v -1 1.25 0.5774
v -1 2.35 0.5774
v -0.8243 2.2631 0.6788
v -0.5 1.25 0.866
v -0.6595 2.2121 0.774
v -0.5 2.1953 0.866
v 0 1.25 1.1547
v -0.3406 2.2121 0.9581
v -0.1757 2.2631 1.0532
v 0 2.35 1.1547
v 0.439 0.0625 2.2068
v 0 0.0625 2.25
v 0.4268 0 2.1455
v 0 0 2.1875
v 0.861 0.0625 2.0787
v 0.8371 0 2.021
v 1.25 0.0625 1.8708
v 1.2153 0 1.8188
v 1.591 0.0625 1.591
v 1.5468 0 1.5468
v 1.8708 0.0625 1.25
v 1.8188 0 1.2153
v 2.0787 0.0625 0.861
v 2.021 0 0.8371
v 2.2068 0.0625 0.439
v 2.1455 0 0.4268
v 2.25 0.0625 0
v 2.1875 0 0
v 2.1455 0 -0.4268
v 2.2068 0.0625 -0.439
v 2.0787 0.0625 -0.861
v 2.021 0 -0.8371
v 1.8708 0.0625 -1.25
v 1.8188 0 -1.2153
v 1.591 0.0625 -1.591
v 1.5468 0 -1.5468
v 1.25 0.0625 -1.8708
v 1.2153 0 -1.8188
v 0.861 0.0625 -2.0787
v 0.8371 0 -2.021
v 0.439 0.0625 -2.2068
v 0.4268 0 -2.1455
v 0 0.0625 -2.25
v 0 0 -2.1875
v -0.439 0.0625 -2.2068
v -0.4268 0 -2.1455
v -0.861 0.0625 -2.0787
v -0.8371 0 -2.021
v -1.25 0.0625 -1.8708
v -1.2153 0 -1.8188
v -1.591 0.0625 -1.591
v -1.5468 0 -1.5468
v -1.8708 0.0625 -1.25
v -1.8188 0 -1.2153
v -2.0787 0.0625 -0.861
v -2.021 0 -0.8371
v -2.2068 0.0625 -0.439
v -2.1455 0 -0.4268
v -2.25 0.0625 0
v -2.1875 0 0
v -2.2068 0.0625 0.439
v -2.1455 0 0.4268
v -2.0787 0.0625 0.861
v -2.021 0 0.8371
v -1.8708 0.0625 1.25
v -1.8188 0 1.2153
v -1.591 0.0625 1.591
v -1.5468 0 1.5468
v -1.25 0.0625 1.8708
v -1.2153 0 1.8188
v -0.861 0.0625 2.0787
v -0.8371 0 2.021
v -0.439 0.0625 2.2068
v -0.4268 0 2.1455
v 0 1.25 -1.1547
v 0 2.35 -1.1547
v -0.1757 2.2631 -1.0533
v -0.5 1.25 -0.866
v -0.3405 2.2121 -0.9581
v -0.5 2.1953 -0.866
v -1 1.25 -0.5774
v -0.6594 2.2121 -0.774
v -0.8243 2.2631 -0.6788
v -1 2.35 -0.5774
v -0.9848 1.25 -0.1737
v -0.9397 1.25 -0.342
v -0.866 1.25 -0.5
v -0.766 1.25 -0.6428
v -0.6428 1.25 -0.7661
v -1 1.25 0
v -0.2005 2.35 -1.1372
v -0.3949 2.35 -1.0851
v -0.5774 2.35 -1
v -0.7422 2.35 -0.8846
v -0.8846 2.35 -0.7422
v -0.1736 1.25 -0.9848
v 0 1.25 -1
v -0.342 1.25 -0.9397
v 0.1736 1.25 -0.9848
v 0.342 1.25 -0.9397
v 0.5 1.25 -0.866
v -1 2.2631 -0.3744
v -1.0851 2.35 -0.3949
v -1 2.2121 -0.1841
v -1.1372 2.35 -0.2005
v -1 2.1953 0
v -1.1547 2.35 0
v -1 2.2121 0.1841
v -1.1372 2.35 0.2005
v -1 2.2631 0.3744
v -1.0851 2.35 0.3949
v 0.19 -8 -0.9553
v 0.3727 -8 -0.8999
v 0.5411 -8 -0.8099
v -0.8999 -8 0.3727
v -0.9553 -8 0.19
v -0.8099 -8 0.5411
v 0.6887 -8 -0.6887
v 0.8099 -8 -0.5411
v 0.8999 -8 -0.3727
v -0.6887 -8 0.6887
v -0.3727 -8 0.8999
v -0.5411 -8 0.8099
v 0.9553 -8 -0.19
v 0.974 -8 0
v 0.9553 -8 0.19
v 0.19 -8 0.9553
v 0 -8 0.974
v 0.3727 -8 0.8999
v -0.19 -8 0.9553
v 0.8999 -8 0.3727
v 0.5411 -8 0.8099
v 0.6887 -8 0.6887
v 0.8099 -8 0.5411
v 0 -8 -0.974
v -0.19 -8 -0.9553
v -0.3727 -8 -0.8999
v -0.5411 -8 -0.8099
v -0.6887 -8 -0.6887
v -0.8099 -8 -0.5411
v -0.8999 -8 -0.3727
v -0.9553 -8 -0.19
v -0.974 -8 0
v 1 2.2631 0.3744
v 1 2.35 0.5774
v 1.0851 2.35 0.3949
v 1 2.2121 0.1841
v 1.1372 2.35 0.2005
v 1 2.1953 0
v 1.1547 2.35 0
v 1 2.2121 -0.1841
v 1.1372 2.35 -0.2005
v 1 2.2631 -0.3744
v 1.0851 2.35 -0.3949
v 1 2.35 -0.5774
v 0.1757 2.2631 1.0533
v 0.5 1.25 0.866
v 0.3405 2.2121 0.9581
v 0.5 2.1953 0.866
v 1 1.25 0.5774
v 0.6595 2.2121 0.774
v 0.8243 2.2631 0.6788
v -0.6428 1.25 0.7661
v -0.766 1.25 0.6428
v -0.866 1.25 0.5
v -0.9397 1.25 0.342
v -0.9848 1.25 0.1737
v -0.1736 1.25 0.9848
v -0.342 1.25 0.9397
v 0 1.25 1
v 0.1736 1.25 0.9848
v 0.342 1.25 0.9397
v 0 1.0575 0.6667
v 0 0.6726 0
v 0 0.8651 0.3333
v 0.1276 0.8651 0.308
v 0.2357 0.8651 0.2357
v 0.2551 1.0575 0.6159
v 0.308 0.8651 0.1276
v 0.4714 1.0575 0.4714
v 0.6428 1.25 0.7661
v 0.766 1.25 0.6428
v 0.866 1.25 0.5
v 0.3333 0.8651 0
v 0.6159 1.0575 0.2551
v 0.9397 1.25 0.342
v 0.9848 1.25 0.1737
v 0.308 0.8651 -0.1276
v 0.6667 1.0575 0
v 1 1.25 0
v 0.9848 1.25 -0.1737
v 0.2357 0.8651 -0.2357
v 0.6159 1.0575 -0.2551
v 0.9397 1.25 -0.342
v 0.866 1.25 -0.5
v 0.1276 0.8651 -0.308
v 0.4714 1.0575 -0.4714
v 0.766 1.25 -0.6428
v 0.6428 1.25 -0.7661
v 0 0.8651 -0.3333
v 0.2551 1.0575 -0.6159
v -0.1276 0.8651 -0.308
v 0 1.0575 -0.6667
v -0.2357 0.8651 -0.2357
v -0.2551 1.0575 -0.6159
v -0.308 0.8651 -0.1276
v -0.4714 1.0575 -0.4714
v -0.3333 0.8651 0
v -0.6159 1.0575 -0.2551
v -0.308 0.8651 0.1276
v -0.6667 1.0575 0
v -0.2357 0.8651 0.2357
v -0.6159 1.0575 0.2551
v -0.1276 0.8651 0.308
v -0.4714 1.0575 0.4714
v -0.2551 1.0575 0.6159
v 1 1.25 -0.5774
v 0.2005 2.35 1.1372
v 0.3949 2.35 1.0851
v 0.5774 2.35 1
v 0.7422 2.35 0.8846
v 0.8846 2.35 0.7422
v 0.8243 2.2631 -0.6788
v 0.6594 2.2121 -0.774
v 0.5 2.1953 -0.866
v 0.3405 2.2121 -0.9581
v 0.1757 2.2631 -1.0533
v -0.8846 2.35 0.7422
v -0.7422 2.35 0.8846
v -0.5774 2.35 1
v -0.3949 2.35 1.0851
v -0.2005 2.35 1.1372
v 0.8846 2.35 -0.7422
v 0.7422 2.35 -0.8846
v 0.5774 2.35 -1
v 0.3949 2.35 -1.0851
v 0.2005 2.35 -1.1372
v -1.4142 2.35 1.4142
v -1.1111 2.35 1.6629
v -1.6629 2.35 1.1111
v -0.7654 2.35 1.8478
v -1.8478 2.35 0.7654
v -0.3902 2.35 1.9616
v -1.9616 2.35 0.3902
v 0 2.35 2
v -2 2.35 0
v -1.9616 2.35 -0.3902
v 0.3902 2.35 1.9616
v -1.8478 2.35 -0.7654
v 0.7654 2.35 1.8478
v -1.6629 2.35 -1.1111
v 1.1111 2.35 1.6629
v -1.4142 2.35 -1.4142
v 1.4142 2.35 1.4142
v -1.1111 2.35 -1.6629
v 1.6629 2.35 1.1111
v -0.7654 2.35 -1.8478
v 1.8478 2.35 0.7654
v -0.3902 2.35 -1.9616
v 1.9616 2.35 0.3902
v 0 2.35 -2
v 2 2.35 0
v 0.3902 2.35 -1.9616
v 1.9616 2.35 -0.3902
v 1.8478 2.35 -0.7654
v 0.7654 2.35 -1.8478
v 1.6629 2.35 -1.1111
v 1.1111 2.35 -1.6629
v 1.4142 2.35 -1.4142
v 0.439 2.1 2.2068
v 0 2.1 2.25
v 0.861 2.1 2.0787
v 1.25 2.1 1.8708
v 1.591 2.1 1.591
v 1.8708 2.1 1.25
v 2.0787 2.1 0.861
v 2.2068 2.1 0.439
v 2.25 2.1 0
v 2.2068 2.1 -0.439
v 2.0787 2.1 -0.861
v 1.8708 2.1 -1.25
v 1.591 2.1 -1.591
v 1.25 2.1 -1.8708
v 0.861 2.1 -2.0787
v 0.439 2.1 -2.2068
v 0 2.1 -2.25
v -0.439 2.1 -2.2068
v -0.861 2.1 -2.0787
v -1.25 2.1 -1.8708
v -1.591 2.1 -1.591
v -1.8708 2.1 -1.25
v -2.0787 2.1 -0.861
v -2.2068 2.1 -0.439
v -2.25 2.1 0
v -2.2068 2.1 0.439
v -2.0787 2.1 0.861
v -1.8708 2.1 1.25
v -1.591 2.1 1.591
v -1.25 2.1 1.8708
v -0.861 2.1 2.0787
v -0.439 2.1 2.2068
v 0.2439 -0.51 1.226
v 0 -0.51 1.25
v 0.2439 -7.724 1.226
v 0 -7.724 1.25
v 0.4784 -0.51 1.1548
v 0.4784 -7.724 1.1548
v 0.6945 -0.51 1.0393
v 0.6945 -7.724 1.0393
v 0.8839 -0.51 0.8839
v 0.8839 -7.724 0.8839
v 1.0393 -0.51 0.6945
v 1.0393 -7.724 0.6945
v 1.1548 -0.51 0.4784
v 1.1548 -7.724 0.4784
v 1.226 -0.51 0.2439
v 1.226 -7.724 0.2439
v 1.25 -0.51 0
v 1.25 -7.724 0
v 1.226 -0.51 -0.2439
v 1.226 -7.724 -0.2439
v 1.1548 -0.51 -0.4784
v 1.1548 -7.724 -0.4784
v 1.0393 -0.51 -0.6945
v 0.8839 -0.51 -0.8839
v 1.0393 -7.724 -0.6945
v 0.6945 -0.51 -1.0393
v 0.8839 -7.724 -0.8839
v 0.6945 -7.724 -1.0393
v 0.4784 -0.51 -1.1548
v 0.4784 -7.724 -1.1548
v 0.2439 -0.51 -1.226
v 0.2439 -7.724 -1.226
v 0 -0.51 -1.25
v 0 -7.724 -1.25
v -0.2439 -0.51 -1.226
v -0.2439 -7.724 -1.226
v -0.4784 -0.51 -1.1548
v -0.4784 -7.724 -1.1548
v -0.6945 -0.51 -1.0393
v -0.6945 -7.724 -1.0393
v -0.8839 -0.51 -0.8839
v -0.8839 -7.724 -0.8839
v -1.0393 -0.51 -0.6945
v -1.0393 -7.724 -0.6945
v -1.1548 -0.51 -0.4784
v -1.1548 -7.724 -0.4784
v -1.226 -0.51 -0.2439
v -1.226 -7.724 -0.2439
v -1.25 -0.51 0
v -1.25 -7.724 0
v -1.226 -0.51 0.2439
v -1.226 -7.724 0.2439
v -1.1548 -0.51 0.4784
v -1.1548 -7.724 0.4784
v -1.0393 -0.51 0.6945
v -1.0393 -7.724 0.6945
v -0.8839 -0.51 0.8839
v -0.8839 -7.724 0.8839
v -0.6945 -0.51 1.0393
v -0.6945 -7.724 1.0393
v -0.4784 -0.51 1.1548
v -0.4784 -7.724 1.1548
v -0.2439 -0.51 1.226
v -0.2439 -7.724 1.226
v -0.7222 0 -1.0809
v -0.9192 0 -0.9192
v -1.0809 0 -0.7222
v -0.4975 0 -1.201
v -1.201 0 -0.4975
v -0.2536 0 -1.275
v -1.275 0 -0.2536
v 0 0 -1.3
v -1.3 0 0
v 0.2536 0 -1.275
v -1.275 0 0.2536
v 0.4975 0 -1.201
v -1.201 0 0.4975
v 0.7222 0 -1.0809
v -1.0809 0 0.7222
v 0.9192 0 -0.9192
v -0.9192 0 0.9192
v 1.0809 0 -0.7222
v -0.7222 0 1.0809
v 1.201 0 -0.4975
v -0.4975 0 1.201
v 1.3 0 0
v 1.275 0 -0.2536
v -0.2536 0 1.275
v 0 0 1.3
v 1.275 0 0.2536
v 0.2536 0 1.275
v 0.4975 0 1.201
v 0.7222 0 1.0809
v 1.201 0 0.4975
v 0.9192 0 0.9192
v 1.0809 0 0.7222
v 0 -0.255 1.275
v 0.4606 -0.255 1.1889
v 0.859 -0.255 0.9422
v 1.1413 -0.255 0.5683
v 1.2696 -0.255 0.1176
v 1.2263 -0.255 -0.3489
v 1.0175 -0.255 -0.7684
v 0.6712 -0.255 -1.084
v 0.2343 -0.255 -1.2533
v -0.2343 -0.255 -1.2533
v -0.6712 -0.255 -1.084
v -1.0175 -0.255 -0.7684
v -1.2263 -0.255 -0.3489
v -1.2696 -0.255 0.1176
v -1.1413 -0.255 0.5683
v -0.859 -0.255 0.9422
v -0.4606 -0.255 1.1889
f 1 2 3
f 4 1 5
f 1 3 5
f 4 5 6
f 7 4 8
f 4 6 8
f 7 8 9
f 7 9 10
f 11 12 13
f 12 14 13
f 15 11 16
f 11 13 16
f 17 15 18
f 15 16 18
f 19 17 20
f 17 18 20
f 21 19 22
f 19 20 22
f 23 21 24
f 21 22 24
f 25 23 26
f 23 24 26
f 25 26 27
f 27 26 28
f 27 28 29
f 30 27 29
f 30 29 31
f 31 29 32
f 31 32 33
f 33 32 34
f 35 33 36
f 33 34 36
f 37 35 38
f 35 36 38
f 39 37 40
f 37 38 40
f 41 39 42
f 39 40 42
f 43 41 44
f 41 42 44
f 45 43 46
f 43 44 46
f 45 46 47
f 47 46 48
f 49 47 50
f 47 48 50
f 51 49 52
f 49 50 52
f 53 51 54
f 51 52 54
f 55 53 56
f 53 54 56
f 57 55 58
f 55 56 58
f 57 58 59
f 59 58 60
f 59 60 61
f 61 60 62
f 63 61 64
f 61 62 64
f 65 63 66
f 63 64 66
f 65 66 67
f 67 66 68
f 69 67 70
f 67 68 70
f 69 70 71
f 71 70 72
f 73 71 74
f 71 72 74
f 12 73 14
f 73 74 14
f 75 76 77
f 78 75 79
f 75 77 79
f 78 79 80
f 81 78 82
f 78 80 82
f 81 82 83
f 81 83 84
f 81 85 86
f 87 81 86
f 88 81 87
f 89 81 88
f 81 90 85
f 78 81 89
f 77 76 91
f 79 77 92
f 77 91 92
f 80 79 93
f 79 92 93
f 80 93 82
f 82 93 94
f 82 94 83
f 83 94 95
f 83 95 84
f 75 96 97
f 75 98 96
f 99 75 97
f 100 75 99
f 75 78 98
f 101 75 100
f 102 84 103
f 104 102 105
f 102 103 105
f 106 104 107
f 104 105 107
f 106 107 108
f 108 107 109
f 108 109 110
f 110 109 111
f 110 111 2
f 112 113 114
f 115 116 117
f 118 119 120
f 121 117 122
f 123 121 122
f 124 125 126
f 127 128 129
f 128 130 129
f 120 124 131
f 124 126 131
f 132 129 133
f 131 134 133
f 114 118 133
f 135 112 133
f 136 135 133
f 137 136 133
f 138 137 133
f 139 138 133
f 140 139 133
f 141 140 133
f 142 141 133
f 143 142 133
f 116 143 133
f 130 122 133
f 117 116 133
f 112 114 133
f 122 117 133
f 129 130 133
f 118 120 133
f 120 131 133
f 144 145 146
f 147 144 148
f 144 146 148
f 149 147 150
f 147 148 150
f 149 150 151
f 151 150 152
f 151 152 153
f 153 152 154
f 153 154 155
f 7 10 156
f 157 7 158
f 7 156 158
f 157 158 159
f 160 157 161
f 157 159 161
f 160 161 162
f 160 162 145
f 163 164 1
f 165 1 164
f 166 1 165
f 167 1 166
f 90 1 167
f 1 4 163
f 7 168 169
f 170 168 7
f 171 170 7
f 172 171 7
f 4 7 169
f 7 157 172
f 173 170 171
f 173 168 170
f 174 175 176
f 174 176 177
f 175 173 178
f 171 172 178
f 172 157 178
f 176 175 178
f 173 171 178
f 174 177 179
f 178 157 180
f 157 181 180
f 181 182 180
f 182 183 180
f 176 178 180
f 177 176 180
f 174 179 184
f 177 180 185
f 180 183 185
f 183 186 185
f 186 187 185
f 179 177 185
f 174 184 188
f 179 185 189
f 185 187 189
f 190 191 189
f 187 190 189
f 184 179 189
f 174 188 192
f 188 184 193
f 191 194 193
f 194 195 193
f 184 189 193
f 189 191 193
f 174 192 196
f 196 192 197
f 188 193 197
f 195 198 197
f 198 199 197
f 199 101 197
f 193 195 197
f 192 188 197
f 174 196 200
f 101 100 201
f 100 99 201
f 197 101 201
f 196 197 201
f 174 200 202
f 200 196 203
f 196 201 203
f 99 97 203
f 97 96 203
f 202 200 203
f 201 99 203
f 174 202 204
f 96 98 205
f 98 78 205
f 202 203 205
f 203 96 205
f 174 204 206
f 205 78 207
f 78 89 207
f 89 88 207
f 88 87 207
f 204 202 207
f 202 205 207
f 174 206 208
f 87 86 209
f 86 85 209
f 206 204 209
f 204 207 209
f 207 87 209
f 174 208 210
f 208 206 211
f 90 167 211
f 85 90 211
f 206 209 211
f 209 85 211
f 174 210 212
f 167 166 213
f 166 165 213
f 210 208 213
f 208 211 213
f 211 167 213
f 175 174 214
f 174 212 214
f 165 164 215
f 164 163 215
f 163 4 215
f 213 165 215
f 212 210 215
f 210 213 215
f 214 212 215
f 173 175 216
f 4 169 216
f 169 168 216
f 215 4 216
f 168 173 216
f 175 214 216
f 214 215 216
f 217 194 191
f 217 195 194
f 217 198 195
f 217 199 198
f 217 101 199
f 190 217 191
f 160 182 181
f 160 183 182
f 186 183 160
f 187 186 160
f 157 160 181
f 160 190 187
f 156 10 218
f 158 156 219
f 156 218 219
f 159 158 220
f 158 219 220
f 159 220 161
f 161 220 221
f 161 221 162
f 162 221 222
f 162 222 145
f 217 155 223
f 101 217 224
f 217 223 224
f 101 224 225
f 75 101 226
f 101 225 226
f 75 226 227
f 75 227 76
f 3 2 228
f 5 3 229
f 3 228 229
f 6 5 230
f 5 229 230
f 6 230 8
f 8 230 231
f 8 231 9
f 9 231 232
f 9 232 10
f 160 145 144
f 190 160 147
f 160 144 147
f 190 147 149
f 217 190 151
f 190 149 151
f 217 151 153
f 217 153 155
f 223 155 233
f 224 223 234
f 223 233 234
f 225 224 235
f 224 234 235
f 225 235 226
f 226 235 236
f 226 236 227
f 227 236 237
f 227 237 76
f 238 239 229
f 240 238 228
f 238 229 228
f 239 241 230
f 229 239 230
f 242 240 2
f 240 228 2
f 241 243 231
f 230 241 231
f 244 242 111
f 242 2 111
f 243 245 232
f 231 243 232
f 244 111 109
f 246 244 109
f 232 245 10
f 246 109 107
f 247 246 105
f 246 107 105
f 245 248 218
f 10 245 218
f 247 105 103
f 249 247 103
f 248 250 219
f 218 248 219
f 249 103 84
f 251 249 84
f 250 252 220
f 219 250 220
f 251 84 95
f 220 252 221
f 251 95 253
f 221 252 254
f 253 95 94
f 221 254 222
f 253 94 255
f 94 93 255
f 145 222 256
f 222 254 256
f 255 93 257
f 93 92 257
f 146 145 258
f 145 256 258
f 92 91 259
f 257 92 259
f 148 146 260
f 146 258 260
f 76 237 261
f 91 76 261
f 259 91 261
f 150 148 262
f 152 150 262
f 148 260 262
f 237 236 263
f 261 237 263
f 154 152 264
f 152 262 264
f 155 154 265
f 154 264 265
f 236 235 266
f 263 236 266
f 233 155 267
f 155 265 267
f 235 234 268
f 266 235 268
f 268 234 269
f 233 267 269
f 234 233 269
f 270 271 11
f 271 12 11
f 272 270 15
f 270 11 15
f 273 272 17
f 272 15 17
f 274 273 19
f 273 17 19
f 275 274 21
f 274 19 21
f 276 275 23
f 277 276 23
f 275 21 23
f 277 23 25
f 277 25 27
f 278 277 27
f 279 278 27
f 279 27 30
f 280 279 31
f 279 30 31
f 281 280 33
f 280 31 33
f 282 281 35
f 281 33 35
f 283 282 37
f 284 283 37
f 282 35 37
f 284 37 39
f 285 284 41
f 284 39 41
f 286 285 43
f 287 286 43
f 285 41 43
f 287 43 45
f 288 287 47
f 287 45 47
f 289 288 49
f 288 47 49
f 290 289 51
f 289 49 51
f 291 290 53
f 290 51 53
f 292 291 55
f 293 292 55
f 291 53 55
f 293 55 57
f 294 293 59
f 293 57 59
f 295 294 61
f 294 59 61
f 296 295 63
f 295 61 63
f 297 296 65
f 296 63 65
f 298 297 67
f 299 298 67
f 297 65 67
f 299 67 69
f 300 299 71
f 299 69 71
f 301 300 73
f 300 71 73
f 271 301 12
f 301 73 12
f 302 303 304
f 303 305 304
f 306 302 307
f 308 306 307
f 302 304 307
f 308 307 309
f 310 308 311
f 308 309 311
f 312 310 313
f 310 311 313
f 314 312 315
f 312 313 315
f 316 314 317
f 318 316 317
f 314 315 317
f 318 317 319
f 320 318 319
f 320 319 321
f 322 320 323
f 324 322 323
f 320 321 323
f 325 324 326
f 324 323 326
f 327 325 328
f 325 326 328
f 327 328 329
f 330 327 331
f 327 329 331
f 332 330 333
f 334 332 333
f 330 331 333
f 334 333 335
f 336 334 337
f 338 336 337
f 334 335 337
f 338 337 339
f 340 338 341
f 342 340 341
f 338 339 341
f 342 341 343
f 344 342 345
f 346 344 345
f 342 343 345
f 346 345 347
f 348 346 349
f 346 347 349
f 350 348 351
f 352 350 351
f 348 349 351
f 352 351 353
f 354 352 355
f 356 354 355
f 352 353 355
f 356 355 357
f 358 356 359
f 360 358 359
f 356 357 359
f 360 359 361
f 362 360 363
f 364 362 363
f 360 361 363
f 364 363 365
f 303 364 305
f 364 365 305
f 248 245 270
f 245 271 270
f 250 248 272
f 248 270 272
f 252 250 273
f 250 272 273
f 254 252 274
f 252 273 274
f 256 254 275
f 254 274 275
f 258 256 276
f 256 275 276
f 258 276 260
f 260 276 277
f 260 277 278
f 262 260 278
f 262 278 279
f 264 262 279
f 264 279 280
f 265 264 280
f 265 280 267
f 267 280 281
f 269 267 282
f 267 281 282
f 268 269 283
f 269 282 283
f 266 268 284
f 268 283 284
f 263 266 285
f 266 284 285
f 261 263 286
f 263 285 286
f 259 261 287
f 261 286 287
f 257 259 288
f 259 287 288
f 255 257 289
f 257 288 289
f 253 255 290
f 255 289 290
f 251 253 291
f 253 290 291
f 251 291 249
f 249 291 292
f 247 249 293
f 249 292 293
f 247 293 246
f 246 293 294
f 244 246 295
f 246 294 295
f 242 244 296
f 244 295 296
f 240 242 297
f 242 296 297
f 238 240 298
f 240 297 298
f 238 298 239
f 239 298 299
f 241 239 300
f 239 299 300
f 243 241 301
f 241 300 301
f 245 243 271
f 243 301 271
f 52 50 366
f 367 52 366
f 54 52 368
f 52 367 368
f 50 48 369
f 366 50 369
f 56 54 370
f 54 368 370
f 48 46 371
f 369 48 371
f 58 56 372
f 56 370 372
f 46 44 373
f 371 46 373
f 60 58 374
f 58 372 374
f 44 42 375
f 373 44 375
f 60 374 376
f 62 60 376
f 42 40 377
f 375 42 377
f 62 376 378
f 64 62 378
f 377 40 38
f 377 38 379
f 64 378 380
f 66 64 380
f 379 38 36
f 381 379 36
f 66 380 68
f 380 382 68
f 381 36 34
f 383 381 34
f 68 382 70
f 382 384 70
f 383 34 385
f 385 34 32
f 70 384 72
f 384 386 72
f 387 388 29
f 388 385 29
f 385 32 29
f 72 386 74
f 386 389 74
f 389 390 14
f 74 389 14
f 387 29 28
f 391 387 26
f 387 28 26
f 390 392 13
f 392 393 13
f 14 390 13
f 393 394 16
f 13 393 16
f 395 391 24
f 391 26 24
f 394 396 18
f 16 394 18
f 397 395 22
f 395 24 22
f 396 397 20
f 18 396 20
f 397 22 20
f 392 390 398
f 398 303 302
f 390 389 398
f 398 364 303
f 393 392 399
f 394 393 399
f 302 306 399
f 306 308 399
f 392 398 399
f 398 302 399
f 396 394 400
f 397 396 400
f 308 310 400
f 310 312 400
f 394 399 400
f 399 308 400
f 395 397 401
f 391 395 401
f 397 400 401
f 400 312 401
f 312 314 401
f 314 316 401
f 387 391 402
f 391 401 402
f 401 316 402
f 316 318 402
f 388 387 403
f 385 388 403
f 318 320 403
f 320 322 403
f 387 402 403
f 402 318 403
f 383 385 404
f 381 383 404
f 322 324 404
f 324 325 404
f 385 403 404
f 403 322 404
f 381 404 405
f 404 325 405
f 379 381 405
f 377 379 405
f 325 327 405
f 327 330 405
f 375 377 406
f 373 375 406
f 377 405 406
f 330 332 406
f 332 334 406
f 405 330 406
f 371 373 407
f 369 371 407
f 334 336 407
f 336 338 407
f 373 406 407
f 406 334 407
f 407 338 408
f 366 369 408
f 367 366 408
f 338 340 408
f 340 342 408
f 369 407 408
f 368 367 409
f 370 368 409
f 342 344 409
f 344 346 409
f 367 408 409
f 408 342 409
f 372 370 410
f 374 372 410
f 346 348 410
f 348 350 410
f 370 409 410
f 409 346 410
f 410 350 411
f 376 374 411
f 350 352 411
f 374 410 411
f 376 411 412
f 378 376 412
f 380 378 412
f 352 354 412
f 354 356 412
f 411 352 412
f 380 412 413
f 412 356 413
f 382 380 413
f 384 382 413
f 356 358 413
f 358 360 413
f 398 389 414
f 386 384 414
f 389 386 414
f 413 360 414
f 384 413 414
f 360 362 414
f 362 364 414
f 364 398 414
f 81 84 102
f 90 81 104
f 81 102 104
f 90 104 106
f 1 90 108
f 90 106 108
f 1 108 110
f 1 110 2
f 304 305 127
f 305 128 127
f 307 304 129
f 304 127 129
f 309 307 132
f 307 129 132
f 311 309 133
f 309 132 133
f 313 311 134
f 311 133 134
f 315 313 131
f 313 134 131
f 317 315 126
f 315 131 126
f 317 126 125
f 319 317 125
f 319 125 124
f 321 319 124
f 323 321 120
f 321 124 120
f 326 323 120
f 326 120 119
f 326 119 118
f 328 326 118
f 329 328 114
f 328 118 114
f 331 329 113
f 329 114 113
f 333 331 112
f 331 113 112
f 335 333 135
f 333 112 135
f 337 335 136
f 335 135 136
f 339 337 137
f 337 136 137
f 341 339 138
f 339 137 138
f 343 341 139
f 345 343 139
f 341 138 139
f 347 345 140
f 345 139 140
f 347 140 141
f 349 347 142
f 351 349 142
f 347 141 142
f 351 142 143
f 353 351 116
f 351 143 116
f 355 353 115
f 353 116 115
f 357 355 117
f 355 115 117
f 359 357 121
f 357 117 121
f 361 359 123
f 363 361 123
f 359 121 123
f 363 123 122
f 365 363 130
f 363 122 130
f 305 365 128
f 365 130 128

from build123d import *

# Parameters (mm, degrees)
CUT_EXTRUDE1_DEPTH = 1.1


with BuildPart() as part:
    # Sketch1 → Revolve1 (revolve)
    with BuildSketch(Plane.XY):
        Polygon((0, 0.672649731), (1, 1.25), (1, 2.195299462), (1.154700538, 2.35), (2, 2.35), (2.25, 2.1), (2.25, 0.0625), (2.1875, 0), (1.3, 0), (1.25, -0.51), (1.25, -7.724), (0.974, -8), (0, -8), align=None)
    revolve(axis=Axis((0, -8, 0), (0, 1, 0)))

    # Sketch2 → Cut-Extrude1 (cut)
    with BuildSketch(Plane(origin=(0, 2.35, 0), x_dir=(1, 0, 0), z_dir=(0, 1, 0))):
        Polygon((-1, -0.577350269), (0, -1.154700538), (1, -0.577350269), (1, 0.577350269), (0, 1.154700538), (-1, 0.577350269), align=None)
    extrude(amount=-CUT_EXTRUDE1_DEPTH, mode=Mode.SUBTRACT)


solid = part.part
